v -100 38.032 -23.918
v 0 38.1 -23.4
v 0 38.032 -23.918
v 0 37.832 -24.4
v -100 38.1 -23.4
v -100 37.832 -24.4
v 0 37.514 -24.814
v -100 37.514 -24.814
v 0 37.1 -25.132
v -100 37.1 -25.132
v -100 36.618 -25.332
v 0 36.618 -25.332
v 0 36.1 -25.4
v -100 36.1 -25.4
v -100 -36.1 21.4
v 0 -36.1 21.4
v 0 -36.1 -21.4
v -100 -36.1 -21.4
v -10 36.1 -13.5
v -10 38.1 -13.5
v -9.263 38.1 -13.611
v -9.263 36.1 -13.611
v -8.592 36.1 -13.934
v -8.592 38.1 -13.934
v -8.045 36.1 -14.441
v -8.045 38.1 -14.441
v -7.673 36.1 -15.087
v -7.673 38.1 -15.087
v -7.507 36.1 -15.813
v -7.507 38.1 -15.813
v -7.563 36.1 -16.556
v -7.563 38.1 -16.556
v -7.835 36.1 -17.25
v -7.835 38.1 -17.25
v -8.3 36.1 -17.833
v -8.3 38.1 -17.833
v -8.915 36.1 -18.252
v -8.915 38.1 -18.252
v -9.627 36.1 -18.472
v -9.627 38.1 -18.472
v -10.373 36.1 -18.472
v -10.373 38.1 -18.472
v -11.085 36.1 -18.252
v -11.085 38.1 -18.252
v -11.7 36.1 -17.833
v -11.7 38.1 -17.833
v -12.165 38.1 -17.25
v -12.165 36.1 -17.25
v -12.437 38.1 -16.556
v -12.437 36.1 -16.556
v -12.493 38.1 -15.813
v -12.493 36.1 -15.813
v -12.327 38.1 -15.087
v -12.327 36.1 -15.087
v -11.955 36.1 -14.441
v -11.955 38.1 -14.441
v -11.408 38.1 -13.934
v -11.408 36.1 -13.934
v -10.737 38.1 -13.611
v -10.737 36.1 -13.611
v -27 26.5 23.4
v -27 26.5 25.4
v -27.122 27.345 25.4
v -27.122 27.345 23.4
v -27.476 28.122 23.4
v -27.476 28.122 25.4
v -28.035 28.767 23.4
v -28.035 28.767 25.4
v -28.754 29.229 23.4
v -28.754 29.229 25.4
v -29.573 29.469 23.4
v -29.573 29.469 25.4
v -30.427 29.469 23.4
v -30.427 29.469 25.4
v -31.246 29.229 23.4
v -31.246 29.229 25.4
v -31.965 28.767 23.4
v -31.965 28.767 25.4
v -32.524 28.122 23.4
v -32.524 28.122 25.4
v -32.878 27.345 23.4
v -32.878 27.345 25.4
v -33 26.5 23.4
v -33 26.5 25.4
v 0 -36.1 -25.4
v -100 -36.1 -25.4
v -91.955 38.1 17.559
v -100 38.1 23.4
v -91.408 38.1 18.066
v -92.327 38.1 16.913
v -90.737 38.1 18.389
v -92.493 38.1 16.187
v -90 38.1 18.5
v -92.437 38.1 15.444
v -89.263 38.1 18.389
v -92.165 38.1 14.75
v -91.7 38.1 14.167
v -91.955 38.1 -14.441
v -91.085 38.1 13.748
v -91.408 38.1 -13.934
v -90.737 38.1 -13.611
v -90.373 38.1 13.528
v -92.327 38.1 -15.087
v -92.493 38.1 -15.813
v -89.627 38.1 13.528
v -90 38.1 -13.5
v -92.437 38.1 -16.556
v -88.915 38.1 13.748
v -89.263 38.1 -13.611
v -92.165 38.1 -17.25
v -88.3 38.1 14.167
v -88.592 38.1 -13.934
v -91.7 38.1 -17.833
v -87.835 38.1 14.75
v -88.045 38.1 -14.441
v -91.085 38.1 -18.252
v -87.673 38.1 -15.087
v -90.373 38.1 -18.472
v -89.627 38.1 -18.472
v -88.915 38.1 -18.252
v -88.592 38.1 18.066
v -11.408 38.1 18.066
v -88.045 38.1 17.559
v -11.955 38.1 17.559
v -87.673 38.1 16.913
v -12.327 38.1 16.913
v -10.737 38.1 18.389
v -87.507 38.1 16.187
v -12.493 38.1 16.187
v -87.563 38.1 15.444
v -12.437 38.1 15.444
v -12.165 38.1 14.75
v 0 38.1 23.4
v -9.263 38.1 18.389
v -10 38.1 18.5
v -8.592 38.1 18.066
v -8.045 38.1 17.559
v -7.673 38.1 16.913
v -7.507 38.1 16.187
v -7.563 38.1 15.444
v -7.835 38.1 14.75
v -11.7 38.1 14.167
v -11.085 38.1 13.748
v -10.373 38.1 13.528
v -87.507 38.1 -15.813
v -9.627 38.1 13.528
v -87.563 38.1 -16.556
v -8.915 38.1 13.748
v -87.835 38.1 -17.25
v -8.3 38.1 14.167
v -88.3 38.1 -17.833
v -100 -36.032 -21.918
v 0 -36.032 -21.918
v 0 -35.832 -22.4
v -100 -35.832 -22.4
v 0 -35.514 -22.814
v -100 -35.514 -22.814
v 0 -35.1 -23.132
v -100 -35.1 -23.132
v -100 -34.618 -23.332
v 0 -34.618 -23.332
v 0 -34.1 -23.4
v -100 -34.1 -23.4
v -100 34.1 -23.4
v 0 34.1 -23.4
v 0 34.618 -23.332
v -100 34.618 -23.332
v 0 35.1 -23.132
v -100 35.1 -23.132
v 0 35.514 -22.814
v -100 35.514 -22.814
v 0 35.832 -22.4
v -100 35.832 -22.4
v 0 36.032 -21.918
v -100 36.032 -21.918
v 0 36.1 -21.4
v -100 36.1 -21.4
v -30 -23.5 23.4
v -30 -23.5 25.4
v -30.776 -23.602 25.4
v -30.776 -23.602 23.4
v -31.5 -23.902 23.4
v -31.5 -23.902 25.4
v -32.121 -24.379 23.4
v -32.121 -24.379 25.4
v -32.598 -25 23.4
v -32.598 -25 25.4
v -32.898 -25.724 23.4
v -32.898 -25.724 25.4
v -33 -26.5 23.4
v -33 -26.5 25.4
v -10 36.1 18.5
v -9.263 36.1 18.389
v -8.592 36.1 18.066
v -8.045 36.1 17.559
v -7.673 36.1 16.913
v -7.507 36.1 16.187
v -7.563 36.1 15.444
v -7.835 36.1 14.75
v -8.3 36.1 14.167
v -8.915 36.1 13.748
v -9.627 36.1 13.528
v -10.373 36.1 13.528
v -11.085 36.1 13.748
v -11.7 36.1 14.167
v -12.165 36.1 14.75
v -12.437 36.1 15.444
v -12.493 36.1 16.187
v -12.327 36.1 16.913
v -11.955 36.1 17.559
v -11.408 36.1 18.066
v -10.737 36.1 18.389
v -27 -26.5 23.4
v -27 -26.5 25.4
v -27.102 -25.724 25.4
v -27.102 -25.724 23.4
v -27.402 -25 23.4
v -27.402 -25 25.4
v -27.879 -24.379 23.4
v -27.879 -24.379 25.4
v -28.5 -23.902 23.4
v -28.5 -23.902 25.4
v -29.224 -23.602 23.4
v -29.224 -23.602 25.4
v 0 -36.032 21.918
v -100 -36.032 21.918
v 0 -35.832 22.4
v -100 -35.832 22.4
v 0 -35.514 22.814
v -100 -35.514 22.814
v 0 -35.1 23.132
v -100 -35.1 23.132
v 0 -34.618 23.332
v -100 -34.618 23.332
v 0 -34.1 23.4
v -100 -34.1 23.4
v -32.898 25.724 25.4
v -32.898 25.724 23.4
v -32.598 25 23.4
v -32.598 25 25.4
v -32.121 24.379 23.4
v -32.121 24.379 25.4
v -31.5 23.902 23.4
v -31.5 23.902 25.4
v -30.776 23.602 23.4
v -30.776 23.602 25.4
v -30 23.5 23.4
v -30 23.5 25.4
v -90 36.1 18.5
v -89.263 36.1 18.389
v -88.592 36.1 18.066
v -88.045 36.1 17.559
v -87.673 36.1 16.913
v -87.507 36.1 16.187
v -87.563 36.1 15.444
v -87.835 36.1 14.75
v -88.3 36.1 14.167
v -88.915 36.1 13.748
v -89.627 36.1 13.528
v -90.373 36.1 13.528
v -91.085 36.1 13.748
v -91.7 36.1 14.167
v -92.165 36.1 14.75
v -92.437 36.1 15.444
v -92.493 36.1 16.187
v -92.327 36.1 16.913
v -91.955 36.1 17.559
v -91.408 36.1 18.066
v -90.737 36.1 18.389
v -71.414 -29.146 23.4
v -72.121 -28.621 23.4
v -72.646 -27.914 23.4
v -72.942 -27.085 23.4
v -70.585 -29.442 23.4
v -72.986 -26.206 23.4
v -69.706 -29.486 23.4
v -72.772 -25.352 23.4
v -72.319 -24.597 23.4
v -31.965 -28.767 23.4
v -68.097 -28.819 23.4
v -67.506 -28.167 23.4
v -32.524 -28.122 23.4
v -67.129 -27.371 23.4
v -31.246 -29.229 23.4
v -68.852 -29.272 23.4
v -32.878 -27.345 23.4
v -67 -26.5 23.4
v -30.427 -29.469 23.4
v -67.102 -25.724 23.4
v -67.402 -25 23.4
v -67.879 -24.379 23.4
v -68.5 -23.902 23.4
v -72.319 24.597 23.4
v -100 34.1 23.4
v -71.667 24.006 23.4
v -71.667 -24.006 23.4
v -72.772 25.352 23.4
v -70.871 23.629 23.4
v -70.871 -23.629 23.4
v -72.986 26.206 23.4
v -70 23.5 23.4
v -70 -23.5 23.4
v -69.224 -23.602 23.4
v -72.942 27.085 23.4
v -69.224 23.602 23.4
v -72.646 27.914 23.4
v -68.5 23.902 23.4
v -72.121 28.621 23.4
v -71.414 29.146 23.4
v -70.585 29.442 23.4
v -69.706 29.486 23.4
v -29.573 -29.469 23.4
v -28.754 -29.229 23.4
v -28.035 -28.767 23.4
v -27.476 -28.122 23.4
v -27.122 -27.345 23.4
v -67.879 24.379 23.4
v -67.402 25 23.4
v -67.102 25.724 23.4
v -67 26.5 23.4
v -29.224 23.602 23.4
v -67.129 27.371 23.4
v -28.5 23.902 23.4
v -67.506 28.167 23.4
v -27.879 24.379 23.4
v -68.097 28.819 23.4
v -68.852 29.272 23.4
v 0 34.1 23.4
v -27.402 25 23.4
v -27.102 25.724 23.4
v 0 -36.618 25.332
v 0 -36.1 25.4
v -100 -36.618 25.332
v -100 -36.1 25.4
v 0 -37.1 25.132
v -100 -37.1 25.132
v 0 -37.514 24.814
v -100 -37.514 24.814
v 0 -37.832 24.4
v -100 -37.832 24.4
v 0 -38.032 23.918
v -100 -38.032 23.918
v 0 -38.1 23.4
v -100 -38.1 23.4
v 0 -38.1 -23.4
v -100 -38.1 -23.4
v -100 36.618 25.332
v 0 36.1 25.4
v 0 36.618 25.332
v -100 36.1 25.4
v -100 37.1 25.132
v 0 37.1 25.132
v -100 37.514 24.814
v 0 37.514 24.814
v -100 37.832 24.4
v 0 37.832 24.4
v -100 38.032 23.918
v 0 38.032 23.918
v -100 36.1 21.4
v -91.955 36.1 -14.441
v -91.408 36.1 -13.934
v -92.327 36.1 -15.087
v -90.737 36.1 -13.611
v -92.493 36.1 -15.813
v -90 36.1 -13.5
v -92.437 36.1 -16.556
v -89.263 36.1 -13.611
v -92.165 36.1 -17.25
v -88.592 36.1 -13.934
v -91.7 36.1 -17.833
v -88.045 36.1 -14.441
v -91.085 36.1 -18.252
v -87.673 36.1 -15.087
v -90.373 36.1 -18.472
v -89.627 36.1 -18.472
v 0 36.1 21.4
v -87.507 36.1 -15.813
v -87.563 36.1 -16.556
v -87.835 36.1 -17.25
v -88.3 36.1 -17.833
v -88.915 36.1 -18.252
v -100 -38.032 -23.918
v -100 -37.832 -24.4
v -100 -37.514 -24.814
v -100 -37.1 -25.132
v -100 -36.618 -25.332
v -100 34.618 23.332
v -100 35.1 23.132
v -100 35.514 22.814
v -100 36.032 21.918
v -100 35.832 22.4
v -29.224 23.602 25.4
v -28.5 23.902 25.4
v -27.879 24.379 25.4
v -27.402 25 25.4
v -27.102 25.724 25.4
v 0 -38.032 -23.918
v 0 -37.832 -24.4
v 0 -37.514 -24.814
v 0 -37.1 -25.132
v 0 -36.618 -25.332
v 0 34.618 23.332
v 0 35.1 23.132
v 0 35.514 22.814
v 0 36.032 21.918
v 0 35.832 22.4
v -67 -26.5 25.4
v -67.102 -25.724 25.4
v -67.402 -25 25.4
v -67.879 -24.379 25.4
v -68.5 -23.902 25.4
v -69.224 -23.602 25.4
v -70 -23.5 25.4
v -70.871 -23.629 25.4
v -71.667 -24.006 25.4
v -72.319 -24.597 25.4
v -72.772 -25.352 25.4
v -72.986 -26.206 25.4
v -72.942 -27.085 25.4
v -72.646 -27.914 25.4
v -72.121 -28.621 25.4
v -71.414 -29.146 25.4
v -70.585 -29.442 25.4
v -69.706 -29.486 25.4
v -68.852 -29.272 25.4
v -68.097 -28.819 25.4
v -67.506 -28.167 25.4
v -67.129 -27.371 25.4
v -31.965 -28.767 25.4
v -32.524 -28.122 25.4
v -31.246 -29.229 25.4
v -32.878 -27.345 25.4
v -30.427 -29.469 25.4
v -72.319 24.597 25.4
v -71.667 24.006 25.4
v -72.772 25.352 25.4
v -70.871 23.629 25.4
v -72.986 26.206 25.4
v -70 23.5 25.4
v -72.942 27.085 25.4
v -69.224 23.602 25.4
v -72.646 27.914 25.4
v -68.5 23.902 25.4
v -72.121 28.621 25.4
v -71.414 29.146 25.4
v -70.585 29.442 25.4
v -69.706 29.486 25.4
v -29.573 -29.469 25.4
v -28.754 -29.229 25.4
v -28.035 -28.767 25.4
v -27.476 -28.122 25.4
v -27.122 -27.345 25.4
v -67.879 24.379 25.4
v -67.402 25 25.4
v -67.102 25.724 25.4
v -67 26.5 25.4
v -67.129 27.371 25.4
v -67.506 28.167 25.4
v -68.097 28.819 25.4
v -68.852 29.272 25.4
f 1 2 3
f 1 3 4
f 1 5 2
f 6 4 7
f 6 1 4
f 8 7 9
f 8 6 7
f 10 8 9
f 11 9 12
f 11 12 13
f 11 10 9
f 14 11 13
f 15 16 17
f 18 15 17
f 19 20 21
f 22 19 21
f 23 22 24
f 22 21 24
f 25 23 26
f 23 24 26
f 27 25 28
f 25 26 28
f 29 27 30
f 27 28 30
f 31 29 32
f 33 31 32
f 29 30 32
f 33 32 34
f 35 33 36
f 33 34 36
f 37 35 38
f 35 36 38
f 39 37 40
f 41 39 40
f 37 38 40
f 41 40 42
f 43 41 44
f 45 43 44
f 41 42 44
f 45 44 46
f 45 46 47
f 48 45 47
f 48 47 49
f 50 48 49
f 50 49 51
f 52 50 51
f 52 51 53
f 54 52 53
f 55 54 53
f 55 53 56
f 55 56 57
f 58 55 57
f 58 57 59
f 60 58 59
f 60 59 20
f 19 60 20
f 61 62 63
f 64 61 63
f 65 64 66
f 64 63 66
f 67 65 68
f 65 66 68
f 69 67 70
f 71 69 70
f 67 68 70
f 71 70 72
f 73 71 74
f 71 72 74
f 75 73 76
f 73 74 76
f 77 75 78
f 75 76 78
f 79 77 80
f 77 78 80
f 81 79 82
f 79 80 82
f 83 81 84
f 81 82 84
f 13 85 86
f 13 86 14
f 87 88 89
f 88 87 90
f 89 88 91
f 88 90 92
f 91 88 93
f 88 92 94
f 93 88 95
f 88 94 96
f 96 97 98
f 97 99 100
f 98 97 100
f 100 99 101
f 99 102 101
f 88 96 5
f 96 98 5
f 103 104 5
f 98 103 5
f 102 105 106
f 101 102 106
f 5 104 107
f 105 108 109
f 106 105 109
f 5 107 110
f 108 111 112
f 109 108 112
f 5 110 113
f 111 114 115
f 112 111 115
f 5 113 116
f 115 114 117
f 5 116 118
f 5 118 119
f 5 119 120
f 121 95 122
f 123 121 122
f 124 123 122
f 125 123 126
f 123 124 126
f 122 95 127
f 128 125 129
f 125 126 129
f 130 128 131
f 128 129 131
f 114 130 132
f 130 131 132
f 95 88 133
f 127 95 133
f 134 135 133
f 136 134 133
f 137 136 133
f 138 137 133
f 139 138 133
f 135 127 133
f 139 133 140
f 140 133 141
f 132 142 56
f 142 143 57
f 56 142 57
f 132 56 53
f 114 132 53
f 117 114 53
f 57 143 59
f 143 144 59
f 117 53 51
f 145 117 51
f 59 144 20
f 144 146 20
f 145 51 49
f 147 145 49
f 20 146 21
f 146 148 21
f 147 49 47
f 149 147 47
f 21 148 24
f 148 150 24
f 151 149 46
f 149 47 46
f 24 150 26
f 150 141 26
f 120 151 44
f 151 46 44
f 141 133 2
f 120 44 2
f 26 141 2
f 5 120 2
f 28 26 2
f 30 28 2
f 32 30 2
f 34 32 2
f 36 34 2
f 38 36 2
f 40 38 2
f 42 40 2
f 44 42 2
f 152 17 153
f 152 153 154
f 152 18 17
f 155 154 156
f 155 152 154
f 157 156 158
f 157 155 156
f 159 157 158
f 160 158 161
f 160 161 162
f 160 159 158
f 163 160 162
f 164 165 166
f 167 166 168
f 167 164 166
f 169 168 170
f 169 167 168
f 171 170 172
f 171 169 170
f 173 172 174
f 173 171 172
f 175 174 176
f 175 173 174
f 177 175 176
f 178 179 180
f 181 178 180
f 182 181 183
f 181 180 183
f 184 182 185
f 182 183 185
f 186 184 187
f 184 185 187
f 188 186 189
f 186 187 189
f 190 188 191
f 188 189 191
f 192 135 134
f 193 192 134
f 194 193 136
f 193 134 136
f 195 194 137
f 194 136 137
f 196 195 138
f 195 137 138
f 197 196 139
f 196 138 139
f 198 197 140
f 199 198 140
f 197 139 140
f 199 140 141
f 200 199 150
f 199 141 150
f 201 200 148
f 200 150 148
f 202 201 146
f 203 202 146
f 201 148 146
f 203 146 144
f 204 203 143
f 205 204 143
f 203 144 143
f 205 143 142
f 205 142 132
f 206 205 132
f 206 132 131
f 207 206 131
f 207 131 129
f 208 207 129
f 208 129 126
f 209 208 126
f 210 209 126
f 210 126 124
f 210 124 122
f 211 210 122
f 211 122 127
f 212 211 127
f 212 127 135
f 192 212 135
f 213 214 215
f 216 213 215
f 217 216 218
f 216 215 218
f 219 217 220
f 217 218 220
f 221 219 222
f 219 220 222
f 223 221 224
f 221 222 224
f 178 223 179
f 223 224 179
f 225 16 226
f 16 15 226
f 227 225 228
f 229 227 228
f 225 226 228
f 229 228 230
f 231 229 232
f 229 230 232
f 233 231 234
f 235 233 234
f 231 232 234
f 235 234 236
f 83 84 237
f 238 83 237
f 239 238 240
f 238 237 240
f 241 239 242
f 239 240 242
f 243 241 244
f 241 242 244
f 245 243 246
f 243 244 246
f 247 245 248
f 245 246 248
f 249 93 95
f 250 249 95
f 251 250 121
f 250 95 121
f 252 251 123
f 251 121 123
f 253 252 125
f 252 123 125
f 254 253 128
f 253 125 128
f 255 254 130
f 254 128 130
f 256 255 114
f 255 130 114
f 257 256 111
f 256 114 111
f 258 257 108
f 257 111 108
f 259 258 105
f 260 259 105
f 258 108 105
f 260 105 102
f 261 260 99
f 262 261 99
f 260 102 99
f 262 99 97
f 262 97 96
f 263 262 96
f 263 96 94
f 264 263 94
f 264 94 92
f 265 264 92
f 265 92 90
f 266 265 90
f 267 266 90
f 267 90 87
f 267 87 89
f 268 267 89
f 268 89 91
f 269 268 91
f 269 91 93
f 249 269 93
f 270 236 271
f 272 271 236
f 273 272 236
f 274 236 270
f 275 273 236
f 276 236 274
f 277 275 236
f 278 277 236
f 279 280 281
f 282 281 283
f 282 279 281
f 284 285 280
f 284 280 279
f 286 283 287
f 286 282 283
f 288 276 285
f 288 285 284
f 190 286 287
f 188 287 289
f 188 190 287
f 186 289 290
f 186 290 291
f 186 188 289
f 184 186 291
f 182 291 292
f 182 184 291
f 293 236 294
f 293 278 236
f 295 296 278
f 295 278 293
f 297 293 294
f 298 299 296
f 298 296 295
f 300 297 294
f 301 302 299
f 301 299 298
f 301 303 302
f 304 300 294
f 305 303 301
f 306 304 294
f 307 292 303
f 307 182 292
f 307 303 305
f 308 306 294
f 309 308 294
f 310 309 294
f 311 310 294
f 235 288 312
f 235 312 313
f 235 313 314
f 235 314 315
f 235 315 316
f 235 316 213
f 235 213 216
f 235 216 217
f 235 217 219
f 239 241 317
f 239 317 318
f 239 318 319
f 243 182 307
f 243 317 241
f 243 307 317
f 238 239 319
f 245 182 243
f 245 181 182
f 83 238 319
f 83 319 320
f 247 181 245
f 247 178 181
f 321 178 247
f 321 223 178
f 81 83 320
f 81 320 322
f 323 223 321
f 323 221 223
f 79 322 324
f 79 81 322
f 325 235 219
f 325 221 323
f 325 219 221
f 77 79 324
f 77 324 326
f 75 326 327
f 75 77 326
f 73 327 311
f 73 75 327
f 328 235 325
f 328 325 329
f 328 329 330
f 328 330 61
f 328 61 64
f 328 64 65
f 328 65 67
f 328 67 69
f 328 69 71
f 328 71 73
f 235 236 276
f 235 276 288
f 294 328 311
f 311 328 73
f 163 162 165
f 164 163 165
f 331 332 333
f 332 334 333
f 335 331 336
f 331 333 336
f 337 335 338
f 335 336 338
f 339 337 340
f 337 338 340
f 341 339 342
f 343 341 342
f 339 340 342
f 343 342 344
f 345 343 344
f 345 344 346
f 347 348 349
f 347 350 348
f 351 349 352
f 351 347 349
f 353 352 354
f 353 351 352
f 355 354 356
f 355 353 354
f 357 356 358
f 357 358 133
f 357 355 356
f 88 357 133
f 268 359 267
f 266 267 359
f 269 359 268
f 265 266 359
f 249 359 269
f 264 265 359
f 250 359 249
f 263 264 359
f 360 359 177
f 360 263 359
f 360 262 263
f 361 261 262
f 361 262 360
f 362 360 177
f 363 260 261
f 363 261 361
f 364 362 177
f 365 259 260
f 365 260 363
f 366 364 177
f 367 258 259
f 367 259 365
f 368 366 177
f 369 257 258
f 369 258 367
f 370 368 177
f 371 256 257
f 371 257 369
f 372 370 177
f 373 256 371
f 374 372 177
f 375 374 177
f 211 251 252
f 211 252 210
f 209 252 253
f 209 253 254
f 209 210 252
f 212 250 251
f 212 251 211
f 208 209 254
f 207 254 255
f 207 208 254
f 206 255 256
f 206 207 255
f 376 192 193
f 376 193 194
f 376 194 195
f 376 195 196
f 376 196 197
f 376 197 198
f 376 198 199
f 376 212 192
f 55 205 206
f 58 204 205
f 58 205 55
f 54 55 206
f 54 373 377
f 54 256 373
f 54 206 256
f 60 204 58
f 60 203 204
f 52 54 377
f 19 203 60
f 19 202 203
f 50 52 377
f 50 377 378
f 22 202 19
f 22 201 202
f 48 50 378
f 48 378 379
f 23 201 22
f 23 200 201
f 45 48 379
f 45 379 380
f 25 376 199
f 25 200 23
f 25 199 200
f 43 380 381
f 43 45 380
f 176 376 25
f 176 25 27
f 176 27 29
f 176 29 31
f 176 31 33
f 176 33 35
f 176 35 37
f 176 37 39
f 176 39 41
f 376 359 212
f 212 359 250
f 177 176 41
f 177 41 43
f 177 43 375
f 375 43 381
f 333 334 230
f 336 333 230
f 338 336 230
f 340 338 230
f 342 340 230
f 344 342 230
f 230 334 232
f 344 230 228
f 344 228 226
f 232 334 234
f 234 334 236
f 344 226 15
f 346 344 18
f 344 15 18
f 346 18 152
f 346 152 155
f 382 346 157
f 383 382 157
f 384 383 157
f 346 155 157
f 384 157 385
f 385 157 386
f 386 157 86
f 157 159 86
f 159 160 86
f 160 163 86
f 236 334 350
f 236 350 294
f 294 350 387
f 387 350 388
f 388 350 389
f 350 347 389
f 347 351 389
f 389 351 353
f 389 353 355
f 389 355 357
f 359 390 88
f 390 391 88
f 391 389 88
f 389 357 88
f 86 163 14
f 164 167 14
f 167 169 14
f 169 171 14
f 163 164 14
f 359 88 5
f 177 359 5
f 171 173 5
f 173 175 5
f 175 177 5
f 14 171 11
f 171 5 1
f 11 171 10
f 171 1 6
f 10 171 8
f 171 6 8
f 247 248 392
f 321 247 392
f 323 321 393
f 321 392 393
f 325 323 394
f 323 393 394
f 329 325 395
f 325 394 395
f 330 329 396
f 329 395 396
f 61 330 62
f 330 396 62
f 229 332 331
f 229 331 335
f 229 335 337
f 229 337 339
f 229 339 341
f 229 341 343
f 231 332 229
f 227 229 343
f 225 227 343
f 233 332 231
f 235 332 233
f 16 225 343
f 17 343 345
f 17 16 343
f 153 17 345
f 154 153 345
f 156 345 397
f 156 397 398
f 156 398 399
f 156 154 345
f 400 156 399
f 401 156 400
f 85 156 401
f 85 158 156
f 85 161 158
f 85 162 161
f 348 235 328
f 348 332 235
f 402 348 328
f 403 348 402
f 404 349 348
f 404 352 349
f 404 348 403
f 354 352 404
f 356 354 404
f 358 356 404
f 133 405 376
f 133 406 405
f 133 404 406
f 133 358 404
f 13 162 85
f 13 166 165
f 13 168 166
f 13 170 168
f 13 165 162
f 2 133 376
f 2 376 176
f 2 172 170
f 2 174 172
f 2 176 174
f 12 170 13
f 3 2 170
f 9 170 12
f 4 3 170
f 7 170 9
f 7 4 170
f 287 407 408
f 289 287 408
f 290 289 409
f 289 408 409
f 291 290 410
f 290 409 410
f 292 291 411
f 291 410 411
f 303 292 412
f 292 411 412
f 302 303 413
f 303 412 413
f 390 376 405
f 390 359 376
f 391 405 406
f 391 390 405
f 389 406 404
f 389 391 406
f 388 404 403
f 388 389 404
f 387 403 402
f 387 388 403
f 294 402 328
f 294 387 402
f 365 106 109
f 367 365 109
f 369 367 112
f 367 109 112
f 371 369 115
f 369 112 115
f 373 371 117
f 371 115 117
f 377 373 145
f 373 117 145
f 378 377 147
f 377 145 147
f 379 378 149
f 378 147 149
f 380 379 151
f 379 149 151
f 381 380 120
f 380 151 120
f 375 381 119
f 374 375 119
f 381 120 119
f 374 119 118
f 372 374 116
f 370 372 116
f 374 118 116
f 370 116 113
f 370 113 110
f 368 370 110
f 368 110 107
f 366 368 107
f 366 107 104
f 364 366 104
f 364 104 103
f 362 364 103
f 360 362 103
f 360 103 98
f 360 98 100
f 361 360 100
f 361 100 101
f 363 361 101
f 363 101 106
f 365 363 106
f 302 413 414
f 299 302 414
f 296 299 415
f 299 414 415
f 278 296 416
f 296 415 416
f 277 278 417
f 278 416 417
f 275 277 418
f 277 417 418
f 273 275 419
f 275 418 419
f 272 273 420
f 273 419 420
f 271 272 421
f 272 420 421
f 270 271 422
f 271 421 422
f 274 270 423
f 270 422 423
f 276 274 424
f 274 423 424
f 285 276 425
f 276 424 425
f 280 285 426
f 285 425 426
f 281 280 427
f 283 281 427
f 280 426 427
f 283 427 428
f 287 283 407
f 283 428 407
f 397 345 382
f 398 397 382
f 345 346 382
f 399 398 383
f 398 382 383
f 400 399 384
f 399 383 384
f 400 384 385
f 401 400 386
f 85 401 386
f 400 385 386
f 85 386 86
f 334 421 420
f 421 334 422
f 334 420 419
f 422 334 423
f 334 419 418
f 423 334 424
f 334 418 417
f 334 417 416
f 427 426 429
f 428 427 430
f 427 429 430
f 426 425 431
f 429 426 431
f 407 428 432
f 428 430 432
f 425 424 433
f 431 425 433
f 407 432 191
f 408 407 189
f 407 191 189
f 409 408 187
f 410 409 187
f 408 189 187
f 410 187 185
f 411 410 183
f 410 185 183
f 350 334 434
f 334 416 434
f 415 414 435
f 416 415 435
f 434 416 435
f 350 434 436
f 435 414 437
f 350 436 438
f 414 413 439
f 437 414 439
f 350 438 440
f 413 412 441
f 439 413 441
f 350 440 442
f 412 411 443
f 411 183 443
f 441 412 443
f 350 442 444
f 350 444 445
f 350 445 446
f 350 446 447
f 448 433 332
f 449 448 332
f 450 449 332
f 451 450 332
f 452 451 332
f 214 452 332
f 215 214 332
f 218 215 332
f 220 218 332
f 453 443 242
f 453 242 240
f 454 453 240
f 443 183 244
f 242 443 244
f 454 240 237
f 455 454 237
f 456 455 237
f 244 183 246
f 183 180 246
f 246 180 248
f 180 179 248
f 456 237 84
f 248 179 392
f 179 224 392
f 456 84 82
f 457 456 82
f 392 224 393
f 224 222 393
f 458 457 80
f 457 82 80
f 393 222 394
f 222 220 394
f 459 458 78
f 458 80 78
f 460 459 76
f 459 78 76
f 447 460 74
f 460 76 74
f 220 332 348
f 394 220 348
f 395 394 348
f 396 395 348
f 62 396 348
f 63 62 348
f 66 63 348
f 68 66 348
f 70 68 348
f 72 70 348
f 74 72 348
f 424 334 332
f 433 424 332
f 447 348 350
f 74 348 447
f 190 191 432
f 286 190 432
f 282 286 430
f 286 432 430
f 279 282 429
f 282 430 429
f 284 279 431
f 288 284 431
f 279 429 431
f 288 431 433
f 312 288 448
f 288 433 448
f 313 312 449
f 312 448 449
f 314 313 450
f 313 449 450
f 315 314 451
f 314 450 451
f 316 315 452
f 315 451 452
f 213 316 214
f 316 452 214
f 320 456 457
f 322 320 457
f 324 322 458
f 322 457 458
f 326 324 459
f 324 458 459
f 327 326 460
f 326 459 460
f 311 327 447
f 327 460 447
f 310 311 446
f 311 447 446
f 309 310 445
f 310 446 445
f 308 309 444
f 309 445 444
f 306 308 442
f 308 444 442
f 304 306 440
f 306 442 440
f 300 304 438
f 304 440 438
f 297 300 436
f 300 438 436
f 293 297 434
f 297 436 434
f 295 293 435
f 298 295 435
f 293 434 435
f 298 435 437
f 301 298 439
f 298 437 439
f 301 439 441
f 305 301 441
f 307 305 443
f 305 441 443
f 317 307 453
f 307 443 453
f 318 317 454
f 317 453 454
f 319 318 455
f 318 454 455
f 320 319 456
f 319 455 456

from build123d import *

# Parameters (mm, degrees)
SKETCH1_W             = 50.8
SKETCH1_H             = 76.2
BOSS_EXTRUDE1_DEPTH   = 100
SKETCH2_W             = 46.8
SKETCH2_H             = 72.2
CUT_EXTRUDE1_DEPTH    = 110.985317202
FILLET2_R             = 2
CORTAR_EXTRUIR2_DEPTH = 10
CROQUIS8_R            = 2.5
CORTAR_EXTRUIR8_DEPTH = 10


with BuildPart() as part:
    # Sketch1 → Boss-Extrude1 (new body)
    with BuildSketch(Plane(origin=(0, 0, 0), x_dir=(0, 0, -1), z_dir=(1, 0, 0))):
        Rectangle(SKETCH1_W, SKETCH1_H)
    extrude(amount=-BOSS_EXTRUDE1_DEPTH)

    # Sketch2 → Cut-Extrude1 (cut, through all)
    with BuildSketch(Plane(origin=(0, 0, 0), x_dir=(0, 0, -1), z_dir=(1, 0, 0))):
        Rectangle(SKETCH2_W, SKETCH2_H)
    extrude(amount=-CUT_EXTRUDE1_DEPTH, mode=Mode.SUBTRACT)

    # Fillet2
    fillet2_edges = [part.edges().sort_by_distance(p)[0] for p in [
        (-50, -36.1, 23.4),
        (-50, 36.1, 23.4),
        (-50, 36.1, -23.4),
        (-50, -36.1, -23.4),
        (-50, 38.1, 25.4),
        (-50, 38.1, -25.4),
        (-50, -38.1, -25.4),
        (-50, -38.1, 25.4),
    ]]
    fillet(fillet2_edges, radius=FILLET2_R)

    # Croquis2 → Cortar-Extruir2 (cut)
    with BuildSketch(Plane.XY.offset(25.4)):
        with BuildLine():
            ThreePointArc((-27, 26.5), (-30, 29.5), (-33, 26.5))
            Line((-33, 26.5), (-30, 26.5))
            Line((-30, 26.5), (-30, 23.5))
            ThreePointArc((-30, 23.5), (-27.878679656, 24.378679656), (-27, 26.5))
        make_face()
        with BuildLine():
            Line((-30, 26.5), (-33, 26.5))
            ThreePointArc((-33, 26.5), (-32.121320344, 24.378679656), (-30, 23.5))
            Line((-30, 23.5), (-30, 26.5))
        make_face()
        with BuildLine():
            ThreePointArc((-70, 23.5), (-67.878679656, 24.378679656), (-67, 26.5))
            Line((-67, 26.5), (-70, 26.5))
            Line((-70, 26.5), (-70, 23.5))
        make_face()
        with BuildLine():
            Line((-70, 26.5), (-67, 26.5))
            ThreePointArc((-67, 26.5), (-72.121320344, 28.621320344), (-70, 23.5))
            Line((-70, 23.5), (-70, 26.5))
        make_face()
        with BuildLine():
            ThreePointArc((-67, -26.5), (-67.878679656, -24.378679656), (-70, -23.5))
            Line((-70, -23.5), (-70, -26.5))
            Line((-70, -26.5), (-67, -26.5))
        make_face()
        with BuildLine():
            Line((-70, -26.5), (-70, -23.5))
            ThreePointArc((-70, -23.5), (-72.121320344, -28.621320344), (-67, -26.5))
            Line((-67, -26.5), (-70, -26.5))
        make_face()
        with BuildLine():
            ThreePointArc((-27, -26.5), (-27.878679656, -24.378679656), (-30, -23.5))
            Line((-30, -23.5), (-30, -26.5))
            Line((-30, -26.5), (-33, -26.5))
            ThreePointArc((-33, -26.5), (-30, -29.5), (-27, -26.5))
        make_face()
        with BuildLine():
            Line((-30, -26.5), (-30, -23.5))
            ThreePointArc((-30, -23.5), (-32.121320344, -24.378679656), (-33, -26.5))
            Line((-33, -26.5), (-30, -26.5))
        make_face()
    extrude(amount=-CORTAR_EXTRUIR2_DEPTH, mode=Mode.SUBTRACT)

    # Croquis8 → Cortar-Extruir8 (cut)
    with BuildSketch(Plane(origin=(0, 38.1, 0), x_dir=(1, 0, 0), z_dir=(0, 1, 0))):
        with Locations(Location((-90, 16, 0), (0, 0, 270))):
            Circle(CROQUIS8_R)
        with Locations(Location((-10, 16, 0), (0, 0, 270))):
            Circle(CROQUIS8_R)
        with Locations(Location((-90, -16, 0), (0, 0, 270))):
            Circle(CROQUIS8_R)
        with Locations(Location((-10, -16, 0), (0, 0, 270))):
            Circle(CROQUIS8_R)
    extrude(amount=-CORTAR_EXTRUIR8_DEPTH, mode=Mode.SUBTRACT)


solid = part.part
